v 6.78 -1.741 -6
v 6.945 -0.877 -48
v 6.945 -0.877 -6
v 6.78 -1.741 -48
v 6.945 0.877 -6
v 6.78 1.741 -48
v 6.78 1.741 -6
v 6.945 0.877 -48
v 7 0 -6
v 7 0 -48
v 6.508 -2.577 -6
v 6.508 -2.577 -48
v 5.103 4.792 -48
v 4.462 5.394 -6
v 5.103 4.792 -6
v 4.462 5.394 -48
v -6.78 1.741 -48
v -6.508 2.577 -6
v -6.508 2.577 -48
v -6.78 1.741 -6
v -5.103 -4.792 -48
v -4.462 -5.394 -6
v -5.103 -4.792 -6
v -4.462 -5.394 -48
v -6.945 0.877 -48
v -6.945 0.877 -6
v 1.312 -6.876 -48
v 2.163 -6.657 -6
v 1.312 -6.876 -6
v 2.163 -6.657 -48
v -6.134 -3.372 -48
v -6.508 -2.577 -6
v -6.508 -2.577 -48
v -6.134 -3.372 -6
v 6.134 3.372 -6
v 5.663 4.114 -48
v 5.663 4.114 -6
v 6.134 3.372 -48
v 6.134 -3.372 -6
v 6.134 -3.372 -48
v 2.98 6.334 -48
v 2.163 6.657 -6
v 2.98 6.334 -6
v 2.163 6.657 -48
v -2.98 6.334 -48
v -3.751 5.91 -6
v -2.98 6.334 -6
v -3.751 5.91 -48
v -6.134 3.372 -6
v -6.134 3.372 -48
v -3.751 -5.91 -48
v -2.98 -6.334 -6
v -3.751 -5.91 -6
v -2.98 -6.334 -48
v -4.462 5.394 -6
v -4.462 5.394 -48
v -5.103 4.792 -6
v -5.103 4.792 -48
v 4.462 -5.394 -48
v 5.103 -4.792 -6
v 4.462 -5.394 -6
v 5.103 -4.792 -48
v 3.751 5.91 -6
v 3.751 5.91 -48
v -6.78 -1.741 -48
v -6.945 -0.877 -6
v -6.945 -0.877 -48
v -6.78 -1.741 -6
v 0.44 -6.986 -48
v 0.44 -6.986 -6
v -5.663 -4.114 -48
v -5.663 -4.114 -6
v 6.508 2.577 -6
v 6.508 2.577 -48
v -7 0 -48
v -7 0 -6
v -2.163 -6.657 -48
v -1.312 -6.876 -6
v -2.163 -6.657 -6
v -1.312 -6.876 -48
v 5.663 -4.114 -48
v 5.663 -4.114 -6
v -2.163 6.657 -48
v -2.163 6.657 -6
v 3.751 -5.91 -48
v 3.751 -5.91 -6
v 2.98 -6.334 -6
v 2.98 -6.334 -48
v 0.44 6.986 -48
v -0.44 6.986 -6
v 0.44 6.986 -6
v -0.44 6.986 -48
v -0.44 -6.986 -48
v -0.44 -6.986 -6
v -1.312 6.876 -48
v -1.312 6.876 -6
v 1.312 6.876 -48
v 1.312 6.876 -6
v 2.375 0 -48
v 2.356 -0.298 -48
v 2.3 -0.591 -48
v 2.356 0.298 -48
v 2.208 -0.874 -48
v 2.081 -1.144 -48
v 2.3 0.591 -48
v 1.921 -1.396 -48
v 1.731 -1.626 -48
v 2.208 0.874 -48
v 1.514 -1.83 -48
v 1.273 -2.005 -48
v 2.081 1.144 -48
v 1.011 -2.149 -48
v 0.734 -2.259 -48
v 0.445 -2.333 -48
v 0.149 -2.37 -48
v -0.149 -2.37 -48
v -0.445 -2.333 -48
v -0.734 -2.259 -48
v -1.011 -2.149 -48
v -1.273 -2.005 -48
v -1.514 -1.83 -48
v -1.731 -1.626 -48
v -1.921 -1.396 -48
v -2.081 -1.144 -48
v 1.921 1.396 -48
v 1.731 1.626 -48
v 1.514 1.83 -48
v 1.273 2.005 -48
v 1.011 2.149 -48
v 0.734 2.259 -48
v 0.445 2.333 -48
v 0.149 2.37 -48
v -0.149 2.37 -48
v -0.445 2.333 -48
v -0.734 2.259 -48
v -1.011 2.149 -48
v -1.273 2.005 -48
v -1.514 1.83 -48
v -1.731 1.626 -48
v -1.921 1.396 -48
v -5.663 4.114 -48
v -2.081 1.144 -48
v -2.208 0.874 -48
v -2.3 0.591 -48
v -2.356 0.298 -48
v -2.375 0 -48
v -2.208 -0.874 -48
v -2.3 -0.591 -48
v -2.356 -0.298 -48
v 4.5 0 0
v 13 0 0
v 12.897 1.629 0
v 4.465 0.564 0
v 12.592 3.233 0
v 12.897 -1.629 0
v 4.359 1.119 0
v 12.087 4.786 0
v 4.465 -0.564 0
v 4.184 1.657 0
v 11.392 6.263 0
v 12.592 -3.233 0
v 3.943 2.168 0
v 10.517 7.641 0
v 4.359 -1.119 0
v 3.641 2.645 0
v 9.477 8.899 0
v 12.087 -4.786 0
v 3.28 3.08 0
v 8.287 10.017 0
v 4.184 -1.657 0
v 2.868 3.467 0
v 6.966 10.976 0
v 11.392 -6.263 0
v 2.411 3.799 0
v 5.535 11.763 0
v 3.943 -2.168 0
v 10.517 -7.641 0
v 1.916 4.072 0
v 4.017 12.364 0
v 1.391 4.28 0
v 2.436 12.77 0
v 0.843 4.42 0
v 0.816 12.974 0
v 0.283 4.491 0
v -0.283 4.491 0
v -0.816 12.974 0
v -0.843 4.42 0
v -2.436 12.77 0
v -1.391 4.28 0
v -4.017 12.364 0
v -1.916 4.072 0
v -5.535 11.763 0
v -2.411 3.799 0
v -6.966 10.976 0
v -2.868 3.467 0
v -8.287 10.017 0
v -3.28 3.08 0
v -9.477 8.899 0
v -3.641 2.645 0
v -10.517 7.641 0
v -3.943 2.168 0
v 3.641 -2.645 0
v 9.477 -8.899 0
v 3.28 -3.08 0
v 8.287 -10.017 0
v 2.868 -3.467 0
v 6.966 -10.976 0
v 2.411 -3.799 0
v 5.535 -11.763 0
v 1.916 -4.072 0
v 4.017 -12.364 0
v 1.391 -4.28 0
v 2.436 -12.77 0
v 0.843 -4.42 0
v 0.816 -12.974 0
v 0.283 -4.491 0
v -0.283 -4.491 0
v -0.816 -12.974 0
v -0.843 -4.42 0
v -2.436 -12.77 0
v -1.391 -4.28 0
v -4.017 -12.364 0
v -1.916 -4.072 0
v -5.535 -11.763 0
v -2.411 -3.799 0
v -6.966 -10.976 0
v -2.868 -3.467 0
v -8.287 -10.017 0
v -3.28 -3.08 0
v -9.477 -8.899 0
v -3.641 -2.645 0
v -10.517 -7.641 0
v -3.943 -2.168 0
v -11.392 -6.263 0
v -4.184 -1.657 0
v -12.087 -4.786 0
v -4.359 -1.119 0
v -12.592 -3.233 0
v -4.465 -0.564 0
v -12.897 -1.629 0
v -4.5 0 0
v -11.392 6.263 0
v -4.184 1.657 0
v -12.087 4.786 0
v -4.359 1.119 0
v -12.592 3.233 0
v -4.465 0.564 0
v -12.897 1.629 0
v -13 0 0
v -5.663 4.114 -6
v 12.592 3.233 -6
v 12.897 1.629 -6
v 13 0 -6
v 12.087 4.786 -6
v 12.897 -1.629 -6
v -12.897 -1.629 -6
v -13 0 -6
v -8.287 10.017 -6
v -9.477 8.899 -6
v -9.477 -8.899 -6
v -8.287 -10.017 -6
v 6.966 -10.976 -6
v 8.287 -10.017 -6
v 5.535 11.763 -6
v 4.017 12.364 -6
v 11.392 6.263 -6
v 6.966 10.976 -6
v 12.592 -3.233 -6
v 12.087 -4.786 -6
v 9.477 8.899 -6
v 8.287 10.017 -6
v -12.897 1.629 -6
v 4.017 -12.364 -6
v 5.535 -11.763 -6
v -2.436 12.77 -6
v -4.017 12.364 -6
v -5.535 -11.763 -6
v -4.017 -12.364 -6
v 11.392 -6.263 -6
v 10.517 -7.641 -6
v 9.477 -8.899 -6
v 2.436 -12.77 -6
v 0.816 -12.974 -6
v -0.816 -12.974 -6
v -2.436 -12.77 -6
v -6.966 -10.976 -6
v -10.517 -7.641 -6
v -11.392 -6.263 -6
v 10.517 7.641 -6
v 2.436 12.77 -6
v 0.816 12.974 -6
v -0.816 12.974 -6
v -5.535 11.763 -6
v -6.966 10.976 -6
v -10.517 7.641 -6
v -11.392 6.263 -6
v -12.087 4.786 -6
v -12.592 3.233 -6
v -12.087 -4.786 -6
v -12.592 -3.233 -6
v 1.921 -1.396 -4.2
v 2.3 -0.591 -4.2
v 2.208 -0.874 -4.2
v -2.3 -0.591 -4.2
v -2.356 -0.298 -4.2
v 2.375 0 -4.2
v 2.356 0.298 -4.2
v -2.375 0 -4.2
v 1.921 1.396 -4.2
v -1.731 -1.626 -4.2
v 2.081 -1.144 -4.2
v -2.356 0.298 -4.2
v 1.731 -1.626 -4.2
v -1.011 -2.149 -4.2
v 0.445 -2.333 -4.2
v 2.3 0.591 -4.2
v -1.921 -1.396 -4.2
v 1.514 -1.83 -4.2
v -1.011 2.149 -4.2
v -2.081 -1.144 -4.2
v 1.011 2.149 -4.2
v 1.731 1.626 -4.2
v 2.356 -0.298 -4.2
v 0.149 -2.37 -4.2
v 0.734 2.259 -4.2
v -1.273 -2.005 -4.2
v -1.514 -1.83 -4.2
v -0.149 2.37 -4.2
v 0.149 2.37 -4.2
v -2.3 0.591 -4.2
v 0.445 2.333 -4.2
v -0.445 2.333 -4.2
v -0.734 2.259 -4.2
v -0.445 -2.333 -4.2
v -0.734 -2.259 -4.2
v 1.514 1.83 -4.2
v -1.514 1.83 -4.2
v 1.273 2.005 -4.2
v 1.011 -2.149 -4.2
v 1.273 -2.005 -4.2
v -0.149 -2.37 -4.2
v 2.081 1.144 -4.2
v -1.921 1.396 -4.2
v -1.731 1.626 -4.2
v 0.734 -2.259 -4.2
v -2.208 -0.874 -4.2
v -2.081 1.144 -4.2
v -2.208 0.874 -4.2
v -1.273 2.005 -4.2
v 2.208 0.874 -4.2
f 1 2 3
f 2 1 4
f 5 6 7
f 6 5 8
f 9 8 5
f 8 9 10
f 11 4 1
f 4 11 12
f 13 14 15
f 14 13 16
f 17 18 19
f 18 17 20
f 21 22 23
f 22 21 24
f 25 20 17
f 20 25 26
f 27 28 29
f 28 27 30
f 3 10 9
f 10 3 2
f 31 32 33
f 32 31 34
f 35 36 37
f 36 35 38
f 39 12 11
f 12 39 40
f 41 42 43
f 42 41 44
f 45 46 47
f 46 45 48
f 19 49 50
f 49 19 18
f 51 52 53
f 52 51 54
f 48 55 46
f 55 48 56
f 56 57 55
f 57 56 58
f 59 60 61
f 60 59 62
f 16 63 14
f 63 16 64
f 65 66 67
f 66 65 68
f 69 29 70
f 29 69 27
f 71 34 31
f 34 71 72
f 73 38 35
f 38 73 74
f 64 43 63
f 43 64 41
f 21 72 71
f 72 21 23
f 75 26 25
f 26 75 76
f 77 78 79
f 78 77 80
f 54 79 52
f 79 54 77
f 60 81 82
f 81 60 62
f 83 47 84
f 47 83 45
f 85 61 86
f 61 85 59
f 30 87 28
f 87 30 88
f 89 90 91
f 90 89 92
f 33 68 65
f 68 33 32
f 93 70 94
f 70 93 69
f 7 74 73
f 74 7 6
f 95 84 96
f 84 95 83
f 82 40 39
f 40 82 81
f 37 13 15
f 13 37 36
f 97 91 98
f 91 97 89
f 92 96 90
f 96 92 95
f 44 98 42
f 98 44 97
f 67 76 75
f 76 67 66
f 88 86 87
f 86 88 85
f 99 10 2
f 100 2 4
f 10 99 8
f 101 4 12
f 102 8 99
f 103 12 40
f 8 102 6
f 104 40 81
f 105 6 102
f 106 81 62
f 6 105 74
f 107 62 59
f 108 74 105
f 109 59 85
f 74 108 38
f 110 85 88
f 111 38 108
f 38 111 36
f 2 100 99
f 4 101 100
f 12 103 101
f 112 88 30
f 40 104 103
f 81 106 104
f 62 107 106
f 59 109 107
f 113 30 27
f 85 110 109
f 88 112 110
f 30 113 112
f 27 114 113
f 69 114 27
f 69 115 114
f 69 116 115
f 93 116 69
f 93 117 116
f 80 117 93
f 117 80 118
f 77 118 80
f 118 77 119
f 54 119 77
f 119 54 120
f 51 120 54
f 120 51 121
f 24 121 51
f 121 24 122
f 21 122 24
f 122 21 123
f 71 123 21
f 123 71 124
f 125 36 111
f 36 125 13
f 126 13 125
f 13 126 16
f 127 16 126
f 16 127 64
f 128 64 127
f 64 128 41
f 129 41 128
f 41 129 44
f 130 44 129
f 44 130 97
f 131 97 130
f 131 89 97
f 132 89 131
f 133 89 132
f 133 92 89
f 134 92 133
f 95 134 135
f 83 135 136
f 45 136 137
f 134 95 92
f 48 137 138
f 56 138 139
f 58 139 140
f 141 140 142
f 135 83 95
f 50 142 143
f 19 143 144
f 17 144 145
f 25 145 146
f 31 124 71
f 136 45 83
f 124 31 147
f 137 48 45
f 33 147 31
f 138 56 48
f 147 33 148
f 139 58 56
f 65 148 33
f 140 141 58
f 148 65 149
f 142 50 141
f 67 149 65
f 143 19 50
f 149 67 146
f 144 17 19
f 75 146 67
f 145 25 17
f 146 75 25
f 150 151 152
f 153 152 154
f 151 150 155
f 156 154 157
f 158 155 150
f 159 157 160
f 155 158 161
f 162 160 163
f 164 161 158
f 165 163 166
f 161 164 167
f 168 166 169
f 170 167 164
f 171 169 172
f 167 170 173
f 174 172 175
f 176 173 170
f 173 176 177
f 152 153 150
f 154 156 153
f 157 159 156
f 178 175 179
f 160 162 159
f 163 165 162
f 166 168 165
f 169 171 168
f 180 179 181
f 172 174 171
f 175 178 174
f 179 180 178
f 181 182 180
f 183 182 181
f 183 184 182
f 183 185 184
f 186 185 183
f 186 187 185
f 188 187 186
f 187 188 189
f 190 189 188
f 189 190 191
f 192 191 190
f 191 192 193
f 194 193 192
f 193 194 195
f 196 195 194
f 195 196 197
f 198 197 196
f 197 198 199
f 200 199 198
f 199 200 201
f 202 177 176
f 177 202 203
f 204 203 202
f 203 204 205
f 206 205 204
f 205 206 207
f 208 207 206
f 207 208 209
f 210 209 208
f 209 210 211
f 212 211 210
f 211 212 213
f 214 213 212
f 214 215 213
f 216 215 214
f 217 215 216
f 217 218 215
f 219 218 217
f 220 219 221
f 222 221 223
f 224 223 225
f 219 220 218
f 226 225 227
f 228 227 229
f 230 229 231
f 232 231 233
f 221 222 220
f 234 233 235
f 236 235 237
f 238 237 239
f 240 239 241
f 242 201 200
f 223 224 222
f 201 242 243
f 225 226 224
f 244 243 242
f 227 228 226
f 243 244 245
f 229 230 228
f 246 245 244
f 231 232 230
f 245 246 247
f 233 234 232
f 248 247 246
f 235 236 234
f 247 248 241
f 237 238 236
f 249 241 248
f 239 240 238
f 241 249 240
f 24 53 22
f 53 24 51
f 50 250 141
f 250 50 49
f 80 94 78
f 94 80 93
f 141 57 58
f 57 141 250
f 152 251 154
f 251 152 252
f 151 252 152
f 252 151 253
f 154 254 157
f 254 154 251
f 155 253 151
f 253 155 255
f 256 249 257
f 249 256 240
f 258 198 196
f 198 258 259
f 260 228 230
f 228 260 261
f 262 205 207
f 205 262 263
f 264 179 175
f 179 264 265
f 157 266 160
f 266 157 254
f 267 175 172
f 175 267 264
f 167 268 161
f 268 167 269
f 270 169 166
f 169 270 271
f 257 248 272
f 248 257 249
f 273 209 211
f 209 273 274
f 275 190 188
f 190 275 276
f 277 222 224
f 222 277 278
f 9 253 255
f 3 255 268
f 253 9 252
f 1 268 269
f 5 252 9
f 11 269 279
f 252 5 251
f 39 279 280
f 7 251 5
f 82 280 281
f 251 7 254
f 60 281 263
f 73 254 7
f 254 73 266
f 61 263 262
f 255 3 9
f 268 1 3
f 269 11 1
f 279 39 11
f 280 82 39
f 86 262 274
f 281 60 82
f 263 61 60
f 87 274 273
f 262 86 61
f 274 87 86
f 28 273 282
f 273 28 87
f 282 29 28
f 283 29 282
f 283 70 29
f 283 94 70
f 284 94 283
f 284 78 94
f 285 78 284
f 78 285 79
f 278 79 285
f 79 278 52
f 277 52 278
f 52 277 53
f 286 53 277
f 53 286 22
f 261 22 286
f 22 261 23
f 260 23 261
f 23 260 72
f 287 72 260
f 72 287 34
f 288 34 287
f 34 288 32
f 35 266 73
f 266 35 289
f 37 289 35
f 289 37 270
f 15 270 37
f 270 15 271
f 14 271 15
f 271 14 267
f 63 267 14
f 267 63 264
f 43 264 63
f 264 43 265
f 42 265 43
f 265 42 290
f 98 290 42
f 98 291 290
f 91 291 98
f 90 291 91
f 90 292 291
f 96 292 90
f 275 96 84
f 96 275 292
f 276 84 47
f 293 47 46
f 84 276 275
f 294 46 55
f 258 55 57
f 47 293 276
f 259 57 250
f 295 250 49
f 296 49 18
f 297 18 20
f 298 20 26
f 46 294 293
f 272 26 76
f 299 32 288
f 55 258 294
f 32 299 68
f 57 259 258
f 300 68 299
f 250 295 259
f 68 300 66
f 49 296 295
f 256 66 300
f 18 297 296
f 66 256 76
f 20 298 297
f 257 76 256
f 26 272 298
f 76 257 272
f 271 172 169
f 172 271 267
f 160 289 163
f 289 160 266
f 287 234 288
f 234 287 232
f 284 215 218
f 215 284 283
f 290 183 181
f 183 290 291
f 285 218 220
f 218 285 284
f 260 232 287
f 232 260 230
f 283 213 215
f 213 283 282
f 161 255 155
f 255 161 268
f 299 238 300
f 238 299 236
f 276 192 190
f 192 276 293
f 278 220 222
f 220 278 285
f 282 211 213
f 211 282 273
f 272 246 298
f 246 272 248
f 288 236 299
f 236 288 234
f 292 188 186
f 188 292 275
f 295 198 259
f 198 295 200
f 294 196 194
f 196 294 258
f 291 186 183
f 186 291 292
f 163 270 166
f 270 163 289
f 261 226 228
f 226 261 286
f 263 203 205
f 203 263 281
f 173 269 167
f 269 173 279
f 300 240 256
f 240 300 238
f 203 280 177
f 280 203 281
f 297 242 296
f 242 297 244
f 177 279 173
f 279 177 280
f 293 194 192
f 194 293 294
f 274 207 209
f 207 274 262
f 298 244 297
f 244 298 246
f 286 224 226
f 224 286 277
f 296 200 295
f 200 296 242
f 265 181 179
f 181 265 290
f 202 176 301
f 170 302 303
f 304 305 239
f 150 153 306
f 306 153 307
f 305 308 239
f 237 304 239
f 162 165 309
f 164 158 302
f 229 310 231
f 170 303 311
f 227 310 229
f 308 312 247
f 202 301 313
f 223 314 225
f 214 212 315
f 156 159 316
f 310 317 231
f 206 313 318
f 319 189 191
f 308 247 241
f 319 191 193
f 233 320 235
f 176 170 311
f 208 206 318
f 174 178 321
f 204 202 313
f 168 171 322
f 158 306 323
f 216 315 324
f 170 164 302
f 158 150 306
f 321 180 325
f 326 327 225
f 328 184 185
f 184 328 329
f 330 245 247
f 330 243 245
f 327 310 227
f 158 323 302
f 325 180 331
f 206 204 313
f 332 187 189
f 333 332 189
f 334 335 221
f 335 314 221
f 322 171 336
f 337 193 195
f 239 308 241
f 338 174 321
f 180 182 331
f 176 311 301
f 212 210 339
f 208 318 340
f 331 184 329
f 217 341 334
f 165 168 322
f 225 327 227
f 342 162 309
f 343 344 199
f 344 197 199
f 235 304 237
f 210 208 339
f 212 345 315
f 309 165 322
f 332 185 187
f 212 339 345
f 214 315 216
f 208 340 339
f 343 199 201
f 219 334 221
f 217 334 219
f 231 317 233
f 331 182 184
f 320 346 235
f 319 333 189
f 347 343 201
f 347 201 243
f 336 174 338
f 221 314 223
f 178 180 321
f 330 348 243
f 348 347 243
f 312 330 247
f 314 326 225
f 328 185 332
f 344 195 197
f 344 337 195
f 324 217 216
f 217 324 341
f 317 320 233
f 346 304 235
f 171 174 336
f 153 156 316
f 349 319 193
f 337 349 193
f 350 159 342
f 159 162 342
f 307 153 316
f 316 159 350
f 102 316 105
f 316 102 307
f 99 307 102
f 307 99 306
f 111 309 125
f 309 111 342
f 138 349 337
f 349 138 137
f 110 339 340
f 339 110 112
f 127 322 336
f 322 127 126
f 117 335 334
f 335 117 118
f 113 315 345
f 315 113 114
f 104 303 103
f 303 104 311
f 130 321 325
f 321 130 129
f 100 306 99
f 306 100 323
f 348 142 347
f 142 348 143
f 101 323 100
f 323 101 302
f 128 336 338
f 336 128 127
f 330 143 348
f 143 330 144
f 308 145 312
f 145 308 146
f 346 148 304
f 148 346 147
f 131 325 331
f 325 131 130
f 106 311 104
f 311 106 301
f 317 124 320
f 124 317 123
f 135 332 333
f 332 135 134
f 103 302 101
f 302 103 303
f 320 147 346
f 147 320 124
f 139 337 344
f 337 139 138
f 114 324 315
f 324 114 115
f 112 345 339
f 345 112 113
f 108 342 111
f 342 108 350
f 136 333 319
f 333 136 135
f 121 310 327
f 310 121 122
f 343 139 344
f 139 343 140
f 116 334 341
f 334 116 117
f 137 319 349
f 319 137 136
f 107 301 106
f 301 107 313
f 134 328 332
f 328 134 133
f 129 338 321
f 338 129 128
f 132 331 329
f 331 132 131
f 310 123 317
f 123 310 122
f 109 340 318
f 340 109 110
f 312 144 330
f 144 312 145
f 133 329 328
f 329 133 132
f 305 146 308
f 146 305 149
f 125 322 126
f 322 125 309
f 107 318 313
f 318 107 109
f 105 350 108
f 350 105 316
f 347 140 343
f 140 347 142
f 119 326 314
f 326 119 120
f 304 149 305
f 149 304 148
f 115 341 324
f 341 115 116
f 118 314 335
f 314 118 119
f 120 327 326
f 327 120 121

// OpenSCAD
$fn = 50;


difference() {
	union() {
		translate(v = [0, 0, -48.0000000000]) {
			cylinder(h = 48, r = 7.0000000000);
		}
		translate(v = [0, 0, -6.0000000000]) {
			cylinder(h = 6, r = 13.0000000000);
		}
	}
	union() {
		translate(v = [0, 0, 0]) {
			rotate(a = [0, 0, 0]) {
				difference() {
					union() {
						#translate(v = [0, 0, -48.0000000000]) {
							cylinder(h = 48, r = 2.2500000000);
						}
						#translate(v = [0, 0, -4.2000000000]) {
							cylinder(h = 4.2000000000, r1 = 2.3750000000, r2 = 4.5000000000);
						}
						#translate(v = [0, 0, -48.0000000000]) {
							cylinder(h = 48, r = 2.3750000000);
						}
						#translate(v = [0, 0, -48.0000000000]) {
							cylinder(h = 48, r = 2.2500000000);
						}
					}
					union();
				}
			}
		}
	}
}
